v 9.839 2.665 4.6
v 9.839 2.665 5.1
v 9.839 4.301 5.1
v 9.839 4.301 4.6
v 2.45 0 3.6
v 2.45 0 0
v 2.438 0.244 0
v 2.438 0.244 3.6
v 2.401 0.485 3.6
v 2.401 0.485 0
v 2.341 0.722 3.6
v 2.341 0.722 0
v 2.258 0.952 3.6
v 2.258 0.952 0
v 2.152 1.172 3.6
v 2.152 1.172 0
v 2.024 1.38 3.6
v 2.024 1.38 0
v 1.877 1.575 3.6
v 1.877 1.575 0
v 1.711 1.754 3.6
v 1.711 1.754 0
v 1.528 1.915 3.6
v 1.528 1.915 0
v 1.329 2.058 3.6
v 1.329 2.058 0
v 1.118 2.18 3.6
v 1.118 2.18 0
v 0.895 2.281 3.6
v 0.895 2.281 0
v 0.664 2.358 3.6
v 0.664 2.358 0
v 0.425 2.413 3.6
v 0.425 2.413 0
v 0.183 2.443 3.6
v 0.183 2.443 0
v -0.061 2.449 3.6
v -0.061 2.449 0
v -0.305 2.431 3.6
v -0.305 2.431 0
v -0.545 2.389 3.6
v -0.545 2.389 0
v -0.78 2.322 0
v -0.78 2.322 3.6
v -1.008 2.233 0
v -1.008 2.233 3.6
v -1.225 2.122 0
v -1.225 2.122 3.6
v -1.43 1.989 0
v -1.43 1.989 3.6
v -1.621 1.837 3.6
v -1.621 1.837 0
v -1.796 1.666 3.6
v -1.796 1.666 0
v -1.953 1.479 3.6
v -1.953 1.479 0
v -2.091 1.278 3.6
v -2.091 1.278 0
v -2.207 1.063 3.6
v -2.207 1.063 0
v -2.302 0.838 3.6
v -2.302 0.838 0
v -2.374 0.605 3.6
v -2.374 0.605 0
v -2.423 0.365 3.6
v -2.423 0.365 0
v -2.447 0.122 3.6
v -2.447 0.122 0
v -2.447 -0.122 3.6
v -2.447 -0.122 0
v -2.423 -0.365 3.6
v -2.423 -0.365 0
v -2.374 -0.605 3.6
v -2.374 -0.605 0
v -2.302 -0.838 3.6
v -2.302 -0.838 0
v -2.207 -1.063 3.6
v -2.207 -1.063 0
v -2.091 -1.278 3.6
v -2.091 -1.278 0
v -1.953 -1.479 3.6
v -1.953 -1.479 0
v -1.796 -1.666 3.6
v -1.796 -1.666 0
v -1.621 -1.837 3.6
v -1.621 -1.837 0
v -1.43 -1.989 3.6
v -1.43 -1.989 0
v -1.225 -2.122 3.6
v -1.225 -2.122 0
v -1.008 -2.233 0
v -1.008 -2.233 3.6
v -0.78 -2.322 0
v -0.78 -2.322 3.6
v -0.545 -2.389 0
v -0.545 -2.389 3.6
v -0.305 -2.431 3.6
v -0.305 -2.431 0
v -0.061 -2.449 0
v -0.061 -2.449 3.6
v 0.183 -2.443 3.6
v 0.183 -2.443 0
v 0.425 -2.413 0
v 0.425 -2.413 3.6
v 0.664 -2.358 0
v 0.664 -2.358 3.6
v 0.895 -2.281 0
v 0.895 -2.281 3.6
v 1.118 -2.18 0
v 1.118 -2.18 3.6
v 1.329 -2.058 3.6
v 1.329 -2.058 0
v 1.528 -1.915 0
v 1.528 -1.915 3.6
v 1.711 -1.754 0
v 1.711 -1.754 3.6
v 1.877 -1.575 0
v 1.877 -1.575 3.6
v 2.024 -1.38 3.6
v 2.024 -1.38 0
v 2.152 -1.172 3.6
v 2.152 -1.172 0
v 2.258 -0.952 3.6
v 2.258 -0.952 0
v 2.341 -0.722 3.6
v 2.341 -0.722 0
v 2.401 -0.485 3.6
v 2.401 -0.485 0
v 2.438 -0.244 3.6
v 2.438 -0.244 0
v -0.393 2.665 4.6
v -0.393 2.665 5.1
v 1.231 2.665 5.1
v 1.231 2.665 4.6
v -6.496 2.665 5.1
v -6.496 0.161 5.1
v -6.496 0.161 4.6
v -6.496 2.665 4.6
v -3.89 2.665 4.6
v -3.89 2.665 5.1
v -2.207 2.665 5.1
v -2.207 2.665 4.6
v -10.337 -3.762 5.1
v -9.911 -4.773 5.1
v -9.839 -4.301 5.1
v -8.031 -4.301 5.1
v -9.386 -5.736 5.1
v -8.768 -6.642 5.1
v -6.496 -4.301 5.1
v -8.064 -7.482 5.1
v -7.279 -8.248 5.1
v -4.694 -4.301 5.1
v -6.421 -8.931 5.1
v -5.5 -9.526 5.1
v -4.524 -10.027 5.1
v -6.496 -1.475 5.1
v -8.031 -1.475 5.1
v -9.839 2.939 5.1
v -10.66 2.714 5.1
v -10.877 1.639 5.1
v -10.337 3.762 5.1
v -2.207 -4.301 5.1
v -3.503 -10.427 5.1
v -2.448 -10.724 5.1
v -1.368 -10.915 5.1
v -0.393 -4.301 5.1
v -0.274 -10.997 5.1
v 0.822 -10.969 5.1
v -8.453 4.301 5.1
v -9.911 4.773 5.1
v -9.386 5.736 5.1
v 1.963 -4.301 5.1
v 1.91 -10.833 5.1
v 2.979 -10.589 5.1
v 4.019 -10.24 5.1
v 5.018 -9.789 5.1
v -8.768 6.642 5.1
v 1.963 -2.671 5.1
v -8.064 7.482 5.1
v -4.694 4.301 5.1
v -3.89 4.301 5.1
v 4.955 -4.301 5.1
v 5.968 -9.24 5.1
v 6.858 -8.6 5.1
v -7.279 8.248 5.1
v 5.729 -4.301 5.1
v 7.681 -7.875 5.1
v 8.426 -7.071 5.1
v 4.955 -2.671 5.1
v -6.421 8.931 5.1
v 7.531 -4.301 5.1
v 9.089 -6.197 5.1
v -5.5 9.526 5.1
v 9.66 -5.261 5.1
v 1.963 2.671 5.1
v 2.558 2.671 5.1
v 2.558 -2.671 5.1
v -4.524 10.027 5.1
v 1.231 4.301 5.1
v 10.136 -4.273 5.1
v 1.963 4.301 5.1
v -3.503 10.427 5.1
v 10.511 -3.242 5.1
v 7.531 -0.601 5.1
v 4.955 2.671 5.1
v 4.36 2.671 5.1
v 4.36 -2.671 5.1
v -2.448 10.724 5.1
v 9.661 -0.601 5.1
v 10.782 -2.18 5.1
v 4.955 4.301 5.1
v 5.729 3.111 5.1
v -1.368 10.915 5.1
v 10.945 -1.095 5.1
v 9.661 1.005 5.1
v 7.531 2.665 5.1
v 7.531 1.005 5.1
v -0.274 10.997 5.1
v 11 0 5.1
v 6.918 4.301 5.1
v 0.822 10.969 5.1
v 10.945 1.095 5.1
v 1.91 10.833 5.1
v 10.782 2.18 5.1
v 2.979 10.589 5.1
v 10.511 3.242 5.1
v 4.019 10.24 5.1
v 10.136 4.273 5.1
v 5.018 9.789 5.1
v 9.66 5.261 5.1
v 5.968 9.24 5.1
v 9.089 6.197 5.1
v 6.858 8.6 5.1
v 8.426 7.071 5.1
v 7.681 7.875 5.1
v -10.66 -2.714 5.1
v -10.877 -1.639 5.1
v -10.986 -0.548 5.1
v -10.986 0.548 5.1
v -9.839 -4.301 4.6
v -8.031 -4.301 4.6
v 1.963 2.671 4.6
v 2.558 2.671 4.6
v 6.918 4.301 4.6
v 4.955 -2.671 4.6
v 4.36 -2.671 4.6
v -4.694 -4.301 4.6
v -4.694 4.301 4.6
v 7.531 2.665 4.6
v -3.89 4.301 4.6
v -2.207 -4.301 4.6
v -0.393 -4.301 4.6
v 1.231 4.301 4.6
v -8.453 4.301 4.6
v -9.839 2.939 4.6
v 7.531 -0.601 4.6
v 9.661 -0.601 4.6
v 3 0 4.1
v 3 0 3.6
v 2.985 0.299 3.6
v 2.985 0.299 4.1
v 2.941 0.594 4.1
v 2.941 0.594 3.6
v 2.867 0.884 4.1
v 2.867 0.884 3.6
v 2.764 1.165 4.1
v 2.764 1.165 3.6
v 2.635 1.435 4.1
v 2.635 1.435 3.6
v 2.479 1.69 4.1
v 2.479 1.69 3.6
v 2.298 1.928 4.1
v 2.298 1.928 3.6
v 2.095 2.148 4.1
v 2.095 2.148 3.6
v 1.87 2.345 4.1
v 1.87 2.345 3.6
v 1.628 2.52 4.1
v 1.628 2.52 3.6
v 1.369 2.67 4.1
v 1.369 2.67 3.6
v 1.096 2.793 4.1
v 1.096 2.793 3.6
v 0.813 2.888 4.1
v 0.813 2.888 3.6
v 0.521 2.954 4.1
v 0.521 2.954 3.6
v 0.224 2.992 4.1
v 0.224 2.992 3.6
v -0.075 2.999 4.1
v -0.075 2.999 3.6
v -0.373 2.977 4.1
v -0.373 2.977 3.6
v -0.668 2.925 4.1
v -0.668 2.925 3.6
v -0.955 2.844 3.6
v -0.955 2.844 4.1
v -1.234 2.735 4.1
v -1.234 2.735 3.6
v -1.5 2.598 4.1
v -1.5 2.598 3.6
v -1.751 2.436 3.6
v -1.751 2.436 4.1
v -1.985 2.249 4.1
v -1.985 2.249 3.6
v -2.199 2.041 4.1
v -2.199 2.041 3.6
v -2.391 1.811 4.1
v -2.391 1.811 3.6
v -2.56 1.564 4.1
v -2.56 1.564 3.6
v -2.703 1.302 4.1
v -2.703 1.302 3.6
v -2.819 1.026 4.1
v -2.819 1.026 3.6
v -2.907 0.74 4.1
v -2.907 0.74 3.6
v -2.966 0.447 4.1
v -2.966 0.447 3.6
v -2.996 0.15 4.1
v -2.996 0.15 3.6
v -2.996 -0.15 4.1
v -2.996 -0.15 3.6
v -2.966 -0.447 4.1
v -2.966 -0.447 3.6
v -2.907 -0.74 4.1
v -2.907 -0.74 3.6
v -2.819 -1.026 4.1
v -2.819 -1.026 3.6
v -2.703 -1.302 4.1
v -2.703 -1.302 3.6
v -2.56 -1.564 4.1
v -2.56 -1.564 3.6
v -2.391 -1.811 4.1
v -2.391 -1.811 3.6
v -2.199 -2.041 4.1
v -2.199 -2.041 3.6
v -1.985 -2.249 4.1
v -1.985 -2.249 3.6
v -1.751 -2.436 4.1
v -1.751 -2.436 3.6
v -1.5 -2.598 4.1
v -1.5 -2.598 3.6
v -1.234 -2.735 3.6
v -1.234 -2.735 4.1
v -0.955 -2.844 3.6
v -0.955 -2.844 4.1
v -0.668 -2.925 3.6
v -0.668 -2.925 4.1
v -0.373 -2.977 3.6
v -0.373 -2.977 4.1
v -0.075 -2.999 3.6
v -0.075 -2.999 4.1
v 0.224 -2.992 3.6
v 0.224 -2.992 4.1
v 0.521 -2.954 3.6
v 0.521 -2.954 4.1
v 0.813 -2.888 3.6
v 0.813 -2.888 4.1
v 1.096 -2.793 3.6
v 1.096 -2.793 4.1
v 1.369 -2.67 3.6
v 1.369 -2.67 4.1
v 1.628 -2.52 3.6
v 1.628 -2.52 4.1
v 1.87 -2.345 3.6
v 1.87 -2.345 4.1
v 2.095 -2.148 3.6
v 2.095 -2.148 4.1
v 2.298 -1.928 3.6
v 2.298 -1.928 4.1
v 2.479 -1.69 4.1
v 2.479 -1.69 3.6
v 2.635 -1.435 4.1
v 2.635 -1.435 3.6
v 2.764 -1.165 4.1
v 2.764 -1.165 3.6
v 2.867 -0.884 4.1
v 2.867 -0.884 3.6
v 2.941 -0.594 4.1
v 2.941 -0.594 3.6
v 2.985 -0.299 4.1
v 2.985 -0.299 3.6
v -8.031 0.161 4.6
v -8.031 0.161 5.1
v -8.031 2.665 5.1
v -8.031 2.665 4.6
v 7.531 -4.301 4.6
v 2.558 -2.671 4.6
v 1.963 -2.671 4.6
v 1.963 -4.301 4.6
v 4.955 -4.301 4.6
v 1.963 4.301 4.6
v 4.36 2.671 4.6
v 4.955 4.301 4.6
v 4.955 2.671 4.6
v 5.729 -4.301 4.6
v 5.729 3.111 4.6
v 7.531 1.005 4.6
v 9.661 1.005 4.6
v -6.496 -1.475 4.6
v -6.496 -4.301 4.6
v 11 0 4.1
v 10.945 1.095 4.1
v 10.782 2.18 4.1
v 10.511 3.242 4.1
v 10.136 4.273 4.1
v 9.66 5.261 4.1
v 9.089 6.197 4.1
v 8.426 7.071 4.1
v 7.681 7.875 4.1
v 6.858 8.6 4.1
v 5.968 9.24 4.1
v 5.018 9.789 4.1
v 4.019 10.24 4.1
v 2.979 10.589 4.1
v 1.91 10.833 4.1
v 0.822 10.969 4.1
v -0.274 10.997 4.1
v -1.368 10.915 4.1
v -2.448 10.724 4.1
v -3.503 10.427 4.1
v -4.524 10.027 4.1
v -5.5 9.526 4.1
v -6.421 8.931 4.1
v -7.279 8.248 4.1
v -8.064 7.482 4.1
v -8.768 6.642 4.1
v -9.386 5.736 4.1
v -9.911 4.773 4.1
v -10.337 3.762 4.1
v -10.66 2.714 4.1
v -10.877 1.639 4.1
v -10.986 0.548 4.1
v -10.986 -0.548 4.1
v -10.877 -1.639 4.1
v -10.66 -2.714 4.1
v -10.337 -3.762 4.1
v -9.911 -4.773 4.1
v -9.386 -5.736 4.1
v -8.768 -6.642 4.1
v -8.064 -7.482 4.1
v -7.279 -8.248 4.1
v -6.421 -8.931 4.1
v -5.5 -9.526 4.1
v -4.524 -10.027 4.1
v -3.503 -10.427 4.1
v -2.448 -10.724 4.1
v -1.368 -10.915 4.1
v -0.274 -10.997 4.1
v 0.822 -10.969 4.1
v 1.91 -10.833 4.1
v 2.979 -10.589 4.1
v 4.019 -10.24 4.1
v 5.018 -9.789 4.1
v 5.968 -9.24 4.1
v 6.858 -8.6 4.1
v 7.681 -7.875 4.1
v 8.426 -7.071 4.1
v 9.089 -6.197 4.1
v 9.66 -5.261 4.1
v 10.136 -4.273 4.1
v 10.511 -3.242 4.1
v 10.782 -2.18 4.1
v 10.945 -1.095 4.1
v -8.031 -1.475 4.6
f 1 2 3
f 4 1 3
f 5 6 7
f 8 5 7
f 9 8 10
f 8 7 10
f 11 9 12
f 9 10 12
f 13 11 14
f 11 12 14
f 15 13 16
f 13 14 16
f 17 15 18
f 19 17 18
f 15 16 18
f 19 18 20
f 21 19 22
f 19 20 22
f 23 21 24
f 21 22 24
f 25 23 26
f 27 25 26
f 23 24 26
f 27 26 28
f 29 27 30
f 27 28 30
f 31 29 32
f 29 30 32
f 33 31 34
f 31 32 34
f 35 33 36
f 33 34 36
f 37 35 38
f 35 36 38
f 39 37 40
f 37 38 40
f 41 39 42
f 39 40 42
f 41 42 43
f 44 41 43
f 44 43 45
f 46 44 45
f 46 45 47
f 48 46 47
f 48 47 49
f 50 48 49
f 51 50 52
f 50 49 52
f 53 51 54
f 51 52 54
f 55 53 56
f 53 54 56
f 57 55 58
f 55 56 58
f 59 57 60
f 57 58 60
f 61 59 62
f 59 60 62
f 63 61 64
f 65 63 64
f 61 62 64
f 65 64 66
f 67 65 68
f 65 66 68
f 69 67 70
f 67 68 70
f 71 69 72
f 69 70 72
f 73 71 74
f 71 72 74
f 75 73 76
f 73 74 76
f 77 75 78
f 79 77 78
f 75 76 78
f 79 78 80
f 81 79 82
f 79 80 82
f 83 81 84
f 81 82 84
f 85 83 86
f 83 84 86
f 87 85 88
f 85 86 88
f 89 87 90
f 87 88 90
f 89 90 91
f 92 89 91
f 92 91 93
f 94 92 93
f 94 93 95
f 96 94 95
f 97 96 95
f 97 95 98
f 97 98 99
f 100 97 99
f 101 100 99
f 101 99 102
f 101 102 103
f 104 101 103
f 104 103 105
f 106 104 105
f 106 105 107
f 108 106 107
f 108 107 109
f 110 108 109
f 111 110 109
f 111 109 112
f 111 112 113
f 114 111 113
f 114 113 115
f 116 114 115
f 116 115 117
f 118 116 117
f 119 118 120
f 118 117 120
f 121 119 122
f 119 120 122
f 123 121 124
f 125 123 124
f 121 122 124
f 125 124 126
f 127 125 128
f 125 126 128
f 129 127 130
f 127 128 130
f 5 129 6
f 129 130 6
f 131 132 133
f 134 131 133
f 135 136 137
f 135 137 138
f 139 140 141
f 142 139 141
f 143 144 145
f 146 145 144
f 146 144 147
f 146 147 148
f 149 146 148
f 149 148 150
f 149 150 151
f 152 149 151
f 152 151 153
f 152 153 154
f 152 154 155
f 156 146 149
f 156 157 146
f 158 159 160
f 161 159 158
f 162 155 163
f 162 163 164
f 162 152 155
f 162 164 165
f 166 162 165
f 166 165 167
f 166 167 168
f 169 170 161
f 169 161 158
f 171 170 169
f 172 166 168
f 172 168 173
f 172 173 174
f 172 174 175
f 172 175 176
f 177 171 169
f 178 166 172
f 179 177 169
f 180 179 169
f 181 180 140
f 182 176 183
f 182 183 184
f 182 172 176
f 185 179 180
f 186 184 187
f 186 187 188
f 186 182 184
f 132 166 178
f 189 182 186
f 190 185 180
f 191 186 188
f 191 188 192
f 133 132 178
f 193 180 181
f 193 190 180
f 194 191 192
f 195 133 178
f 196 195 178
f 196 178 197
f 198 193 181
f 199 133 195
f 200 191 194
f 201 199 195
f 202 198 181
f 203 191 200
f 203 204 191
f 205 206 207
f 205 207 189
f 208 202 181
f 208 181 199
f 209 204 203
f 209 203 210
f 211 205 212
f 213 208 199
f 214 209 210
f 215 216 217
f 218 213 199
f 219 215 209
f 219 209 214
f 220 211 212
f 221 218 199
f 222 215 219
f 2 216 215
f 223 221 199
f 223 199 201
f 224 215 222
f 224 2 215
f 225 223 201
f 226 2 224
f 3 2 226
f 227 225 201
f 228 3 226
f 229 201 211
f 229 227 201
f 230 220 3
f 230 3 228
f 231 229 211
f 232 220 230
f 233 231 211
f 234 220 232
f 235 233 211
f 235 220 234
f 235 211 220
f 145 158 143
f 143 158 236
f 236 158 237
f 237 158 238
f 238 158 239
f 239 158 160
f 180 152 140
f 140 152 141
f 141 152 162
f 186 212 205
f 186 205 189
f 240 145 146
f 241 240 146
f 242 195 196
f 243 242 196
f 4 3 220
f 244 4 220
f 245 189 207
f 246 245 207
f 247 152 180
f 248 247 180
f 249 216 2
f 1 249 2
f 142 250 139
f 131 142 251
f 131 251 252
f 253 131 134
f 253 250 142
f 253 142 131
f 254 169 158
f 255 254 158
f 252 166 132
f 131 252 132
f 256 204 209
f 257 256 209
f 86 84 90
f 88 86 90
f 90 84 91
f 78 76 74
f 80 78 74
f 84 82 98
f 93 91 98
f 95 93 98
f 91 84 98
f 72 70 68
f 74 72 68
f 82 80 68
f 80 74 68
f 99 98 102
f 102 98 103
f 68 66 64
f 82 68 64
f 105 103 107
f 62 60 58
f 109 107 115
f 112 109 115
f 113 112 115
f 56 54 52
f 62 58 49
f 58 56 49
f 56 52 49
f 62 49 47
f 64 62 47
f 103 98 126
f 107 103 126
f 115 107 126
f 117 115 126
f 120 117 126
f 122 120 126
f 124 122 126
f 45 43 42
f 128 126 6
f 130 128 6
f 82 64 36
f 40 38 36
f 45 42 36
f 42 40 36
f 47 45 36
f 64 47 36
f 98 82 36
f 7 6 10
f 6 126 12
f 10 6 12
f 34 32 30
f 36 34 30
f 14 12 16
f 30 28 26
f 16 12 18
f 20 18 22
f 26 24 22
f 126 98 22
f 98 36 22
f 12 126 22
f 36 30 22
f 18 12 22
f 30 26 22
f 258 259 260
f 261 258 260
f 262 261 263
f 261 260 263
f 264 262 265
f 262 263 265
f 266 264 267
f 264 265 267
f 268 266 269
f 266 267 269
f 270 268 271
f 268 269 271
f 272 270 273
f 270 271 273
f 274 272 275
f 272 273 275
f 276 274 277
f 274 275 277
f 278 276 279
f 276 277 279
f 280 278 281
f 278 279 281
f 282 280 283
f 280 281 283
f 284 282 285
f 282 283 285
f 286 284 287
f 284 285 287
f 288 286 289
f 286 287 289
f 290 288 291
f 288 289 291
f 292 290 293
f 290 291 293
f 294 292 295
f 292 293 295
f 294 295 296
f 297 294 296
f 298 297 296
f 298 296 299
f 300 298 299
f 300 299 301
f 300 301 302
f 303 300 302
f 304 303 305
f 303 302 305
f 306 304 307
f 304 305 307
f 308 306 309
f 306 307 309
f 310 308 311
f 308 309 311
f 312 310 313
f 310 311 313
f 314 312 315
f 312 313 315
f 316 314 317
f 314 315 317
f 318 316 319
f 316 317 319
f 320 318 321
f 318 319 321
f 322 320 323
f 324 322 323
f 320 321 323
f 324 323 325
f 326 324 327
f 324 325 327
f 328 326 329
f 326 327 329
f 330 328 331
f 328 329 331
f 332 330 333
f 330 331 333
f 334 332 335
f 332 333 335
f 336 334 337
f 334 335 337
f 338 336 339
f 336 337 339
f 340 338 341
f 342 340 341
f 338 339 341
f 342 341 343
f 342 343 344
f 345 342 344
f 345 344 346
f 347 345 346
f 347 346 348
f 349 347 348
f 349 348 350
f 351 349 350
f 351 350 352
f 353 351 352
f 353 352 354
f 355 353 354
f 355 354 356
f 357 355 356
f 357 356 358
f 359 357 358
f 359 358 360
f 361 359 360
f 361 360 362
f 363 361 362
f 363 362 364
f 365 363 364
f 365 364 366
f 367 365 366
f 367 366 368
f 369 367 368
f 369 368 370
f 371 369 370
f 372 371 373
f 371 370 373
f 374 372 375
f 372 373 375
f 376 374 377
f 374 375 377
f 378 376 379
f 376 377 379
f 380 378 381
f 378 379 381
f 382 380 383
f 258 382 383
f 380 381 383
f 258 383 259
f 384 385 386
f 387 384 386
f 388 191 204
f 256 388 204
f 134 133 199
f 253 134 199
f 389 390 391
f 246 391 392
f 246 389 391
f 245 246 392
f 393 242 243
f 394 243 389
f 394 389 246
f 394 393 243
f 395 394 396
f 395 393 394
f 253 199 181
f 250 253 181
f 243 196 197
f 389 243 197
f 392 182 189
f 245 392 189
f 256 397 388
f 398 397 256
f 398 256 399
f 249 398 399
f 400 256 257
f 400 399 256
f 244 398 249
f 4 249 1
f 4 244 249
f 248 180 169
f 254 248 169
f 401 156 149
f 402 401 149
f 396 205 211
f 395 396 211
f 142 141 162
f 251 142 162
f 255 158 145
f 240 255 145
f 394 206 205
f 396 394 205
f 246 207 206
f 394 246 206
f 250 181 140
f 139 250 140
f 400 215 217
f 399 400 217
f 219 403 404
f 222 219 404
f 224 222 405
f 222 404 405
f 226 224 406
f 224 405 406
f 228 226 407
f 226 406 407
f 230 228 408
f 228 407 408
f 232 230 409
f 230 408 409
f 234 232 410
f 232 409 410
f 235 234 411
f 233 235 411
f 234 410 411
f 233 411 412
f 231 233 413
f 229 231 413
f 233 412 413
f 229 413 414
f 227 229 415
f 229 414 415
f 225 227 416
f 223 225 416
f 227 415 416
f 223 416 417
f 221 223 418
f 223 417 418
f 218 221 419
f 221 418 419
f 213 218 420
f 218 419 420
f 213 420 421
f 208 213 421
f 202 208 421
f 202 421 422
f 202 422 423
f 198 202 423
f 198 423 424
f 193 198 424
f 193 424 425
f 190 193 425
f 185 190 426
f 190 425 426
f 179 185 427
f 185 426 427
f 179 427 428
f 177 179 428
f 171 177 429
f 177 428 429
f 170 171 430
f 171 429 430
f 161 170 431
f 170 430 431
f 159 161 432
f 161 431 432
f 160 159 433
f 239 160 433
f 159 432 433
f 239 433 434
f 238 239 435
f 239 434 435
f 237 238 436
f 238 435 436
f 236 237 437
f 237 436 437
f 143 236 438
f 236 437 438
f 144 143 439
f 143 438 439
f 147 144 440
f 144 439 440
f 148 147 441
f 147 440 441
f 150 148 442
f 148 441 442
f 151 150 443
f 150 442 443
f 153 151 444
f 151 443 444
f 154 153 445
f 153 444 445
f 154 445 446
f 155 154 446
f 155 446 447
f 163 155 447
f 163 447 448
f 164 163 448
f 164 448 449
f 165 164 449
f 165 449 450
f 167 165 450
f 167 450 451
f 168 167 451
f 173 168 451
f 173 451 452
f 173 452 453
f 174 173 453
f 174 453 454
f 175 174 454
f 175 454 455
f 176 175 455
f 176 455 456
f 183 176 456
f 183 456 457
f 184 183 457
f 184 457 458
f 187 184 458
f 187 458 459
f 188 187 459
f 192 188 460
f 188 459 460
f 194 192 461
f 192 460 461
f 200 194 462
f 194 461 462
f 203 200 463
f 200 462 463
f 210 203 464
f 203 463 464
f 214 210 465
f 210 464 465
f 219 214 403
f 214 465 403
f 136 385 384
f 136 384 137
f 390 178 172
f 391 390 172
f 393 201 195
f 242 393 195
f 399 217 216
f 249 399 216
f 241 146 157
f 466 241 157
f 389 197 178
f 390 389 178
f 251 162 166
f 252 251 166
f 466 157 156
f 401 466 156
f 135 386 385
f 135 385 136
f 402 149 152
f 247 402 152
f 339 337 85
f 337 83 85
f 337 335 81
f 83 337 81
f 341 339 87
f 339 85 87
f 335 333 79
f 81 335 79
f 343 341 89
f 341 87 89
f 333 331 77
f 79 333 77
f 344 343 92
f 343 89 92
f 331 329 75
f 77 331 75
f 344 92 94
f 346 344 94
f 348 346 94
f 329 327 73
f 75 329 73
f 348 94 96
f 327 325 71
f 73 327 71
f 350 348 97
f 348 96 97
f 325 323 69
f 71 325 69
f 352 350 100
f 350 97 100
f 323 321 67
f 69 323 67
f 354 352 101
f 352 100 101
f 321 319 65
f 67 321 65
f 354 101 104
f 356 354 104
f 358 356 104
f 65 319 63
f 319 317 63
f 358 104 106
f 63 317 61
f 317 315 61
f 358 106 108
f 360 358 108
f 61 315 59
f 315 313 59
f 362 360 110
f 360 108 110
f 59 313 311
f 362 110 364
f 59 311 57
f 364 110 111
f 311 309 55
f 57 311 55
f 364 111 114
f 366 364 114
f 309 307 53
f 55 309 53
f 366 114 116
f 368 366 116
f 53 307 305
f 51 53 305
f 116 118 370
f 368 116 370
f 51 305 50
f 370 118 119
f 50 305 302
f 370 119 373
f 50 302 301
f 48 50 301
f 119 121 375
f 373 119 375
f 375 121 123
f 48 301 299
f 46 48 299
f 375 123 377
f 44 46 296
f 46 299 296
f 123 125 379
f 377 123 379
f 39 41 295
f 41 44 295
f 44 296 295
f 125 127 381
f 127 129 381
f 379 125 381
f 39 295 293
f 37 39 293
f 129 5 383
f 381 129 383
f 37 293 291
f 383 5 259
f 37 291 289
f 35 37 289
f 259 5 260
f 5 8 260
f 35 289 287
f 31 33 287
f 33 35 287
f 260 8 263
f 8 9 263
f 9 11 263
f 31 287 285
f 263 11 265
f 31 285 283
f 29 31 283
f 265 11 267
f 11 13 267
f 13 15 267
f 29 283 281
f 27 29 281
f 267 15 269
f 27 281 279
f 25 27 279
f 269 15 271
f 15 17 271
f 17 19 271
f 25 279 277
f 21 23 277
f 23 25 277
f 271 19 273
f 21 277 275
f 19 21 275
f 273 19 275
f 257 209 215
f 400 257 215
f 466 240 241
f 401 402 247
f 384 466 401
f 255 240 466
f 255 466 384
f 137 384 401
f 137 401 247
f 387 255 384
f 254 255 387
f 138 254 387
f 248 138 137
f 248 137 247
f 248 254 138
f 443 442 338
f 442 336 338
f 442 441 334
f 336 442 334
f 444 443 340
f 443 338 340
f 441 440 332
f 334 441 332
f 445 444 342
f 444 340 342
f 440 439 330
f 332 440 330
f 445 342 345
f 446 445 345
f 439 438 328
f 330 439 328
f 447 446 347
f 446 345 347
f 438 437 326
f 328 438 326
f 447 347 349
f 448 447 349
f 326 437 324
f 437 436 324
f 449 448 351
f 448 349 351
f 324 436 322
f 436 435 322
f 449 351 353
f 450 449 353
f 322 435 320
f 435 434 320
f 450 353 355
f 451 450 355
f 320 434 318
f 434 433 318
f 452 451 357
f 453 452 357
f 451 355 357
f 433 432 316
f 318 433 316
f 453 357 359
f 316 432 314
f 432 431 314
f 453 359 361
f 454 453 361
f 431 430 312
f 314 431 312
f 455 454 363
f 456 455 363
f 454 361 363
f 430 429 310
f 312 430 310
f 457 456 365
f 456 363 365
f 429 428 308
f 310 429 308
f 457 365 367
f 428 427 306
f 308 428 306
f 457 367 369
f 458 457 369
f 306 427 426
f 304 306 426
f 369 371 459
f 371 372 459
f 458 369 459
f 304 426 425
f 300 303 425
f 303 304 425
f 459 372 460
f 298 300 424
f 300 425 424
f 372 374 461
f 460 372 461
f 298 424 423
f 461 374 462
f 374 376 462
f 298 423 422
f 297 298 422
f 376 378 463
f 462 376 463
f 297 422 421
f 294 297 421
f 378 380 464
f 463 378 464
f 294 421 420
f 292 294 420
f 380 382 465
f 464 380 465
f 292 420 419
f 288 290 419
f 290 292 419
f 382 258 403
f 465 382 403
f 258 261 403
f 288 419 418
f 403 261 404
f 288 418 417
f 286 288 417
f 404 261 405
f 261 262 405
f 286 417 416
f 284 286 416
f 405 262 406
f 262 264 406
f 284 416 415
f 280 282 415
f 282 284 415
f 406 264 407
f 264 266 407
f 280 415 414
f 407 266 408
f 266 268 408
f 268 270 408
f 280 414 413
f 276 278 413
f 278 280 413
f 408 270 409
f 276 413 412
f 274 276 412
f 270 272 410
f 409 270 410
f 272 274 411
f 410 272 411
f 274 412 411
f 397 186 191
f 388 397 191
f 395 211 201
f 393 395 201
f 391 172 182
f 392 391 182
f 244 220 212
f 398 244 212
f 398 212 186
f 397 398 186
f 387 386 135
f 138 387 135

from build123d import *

# Parameters (mm, degrees)
F0_R     = 2.45
F1_DEPTH = 3.6
F2_R     = 3
F2_R_2   = 2.45
F3_DEPTH = 0.5
F4_R     = 11
F4_R_2   = 3
F5_DEPTH = 1
F6_W     = 1.534777
F6_H     = 2.504423
F7_DEPTH = 0.5


with BuildPart() as f1:
    # F0 (on Top) → F1 (new body)
    with BuildSketch(Plane.XY):
        Circle(F0_R)
    extrude(amount=F1_DEPTH)

    # F2 (on face) → F3 (join)
    with BuildSketch(Plane.XY.offset(3.6)):
        Circle(F2_R)
        Circle(F2_R_2, mode=Mode.SUBTRACT)
        Circle(F2_R_2)
    extrude(amount=F3_DEPTH)

    # F4 (on face) → F5 (join)
    with BuildSketch(Plane.XY.offset(4.1)):
        Circle(F4_R)
        Circle(F4_R_2, mode=Mode.SUBTRACT)
        Circle(F4_R_2)
    extrude(amount=F5_DEPTH)

    # F6 (on face) → F7 (cut)
    with BuildSketch(Plane.XY.offset(5.1)):
        Polygon((-9.839244, -4.300933), (-8.030824, -4.300933), (-8.030824, -1.475277), (-6.496047, -1.475277), (-6.496047, -4.300933), (-4.693576, -4.300933), (-4.693576, 4.300958), (-8.453185, 4.300958), (-9.839244, 2.938695), align=None)
        with Locations((-7.263435, 1.41284)):
            Rectangle(F6_W, F6_H, mode=Mode.SUBTRACT)
        Polygon((-0.39263, 2.665052), (1.231378, 2.665052), (1.231378, 4.300958), (-3.890495, 4.300958), (-3.890495, 2.665052), (-2.206999, 2.665052), (-2.206999, -4.300933), (-0.39263, -4.300933), align=None)
        Polygon((4.955295, -4.300933), (4.955295, -2.670976), (4.36042, -2.670976), (4.36042, 2.671001), (4.955295, 2.671001), (4.955295, 4.300958), (1.963075, 4.300958), (1.963075, 2.671001), (2.557949, 2.671001), (2.557949, -2.670976), (1.963075, -2.670976), (1.963075, -4.300933), align=None)
        Polygon((7.531104, -4.300933), (7.531104, -0.600811), (9.660756, -0.600811), (9.660756, 1.005351), (7.531104, 1.005351), (7.531104, 2.665052), (9.839219, 2.665052), (9.839219, 4.300958), (6.918383, 4.300958), (5.728633, 3.111209), (5.728633, -4.300933), align=None)
    extrude(amount=-F7_DEPTH, mode=Mode.SUBTRACT)


solid = f1.part
